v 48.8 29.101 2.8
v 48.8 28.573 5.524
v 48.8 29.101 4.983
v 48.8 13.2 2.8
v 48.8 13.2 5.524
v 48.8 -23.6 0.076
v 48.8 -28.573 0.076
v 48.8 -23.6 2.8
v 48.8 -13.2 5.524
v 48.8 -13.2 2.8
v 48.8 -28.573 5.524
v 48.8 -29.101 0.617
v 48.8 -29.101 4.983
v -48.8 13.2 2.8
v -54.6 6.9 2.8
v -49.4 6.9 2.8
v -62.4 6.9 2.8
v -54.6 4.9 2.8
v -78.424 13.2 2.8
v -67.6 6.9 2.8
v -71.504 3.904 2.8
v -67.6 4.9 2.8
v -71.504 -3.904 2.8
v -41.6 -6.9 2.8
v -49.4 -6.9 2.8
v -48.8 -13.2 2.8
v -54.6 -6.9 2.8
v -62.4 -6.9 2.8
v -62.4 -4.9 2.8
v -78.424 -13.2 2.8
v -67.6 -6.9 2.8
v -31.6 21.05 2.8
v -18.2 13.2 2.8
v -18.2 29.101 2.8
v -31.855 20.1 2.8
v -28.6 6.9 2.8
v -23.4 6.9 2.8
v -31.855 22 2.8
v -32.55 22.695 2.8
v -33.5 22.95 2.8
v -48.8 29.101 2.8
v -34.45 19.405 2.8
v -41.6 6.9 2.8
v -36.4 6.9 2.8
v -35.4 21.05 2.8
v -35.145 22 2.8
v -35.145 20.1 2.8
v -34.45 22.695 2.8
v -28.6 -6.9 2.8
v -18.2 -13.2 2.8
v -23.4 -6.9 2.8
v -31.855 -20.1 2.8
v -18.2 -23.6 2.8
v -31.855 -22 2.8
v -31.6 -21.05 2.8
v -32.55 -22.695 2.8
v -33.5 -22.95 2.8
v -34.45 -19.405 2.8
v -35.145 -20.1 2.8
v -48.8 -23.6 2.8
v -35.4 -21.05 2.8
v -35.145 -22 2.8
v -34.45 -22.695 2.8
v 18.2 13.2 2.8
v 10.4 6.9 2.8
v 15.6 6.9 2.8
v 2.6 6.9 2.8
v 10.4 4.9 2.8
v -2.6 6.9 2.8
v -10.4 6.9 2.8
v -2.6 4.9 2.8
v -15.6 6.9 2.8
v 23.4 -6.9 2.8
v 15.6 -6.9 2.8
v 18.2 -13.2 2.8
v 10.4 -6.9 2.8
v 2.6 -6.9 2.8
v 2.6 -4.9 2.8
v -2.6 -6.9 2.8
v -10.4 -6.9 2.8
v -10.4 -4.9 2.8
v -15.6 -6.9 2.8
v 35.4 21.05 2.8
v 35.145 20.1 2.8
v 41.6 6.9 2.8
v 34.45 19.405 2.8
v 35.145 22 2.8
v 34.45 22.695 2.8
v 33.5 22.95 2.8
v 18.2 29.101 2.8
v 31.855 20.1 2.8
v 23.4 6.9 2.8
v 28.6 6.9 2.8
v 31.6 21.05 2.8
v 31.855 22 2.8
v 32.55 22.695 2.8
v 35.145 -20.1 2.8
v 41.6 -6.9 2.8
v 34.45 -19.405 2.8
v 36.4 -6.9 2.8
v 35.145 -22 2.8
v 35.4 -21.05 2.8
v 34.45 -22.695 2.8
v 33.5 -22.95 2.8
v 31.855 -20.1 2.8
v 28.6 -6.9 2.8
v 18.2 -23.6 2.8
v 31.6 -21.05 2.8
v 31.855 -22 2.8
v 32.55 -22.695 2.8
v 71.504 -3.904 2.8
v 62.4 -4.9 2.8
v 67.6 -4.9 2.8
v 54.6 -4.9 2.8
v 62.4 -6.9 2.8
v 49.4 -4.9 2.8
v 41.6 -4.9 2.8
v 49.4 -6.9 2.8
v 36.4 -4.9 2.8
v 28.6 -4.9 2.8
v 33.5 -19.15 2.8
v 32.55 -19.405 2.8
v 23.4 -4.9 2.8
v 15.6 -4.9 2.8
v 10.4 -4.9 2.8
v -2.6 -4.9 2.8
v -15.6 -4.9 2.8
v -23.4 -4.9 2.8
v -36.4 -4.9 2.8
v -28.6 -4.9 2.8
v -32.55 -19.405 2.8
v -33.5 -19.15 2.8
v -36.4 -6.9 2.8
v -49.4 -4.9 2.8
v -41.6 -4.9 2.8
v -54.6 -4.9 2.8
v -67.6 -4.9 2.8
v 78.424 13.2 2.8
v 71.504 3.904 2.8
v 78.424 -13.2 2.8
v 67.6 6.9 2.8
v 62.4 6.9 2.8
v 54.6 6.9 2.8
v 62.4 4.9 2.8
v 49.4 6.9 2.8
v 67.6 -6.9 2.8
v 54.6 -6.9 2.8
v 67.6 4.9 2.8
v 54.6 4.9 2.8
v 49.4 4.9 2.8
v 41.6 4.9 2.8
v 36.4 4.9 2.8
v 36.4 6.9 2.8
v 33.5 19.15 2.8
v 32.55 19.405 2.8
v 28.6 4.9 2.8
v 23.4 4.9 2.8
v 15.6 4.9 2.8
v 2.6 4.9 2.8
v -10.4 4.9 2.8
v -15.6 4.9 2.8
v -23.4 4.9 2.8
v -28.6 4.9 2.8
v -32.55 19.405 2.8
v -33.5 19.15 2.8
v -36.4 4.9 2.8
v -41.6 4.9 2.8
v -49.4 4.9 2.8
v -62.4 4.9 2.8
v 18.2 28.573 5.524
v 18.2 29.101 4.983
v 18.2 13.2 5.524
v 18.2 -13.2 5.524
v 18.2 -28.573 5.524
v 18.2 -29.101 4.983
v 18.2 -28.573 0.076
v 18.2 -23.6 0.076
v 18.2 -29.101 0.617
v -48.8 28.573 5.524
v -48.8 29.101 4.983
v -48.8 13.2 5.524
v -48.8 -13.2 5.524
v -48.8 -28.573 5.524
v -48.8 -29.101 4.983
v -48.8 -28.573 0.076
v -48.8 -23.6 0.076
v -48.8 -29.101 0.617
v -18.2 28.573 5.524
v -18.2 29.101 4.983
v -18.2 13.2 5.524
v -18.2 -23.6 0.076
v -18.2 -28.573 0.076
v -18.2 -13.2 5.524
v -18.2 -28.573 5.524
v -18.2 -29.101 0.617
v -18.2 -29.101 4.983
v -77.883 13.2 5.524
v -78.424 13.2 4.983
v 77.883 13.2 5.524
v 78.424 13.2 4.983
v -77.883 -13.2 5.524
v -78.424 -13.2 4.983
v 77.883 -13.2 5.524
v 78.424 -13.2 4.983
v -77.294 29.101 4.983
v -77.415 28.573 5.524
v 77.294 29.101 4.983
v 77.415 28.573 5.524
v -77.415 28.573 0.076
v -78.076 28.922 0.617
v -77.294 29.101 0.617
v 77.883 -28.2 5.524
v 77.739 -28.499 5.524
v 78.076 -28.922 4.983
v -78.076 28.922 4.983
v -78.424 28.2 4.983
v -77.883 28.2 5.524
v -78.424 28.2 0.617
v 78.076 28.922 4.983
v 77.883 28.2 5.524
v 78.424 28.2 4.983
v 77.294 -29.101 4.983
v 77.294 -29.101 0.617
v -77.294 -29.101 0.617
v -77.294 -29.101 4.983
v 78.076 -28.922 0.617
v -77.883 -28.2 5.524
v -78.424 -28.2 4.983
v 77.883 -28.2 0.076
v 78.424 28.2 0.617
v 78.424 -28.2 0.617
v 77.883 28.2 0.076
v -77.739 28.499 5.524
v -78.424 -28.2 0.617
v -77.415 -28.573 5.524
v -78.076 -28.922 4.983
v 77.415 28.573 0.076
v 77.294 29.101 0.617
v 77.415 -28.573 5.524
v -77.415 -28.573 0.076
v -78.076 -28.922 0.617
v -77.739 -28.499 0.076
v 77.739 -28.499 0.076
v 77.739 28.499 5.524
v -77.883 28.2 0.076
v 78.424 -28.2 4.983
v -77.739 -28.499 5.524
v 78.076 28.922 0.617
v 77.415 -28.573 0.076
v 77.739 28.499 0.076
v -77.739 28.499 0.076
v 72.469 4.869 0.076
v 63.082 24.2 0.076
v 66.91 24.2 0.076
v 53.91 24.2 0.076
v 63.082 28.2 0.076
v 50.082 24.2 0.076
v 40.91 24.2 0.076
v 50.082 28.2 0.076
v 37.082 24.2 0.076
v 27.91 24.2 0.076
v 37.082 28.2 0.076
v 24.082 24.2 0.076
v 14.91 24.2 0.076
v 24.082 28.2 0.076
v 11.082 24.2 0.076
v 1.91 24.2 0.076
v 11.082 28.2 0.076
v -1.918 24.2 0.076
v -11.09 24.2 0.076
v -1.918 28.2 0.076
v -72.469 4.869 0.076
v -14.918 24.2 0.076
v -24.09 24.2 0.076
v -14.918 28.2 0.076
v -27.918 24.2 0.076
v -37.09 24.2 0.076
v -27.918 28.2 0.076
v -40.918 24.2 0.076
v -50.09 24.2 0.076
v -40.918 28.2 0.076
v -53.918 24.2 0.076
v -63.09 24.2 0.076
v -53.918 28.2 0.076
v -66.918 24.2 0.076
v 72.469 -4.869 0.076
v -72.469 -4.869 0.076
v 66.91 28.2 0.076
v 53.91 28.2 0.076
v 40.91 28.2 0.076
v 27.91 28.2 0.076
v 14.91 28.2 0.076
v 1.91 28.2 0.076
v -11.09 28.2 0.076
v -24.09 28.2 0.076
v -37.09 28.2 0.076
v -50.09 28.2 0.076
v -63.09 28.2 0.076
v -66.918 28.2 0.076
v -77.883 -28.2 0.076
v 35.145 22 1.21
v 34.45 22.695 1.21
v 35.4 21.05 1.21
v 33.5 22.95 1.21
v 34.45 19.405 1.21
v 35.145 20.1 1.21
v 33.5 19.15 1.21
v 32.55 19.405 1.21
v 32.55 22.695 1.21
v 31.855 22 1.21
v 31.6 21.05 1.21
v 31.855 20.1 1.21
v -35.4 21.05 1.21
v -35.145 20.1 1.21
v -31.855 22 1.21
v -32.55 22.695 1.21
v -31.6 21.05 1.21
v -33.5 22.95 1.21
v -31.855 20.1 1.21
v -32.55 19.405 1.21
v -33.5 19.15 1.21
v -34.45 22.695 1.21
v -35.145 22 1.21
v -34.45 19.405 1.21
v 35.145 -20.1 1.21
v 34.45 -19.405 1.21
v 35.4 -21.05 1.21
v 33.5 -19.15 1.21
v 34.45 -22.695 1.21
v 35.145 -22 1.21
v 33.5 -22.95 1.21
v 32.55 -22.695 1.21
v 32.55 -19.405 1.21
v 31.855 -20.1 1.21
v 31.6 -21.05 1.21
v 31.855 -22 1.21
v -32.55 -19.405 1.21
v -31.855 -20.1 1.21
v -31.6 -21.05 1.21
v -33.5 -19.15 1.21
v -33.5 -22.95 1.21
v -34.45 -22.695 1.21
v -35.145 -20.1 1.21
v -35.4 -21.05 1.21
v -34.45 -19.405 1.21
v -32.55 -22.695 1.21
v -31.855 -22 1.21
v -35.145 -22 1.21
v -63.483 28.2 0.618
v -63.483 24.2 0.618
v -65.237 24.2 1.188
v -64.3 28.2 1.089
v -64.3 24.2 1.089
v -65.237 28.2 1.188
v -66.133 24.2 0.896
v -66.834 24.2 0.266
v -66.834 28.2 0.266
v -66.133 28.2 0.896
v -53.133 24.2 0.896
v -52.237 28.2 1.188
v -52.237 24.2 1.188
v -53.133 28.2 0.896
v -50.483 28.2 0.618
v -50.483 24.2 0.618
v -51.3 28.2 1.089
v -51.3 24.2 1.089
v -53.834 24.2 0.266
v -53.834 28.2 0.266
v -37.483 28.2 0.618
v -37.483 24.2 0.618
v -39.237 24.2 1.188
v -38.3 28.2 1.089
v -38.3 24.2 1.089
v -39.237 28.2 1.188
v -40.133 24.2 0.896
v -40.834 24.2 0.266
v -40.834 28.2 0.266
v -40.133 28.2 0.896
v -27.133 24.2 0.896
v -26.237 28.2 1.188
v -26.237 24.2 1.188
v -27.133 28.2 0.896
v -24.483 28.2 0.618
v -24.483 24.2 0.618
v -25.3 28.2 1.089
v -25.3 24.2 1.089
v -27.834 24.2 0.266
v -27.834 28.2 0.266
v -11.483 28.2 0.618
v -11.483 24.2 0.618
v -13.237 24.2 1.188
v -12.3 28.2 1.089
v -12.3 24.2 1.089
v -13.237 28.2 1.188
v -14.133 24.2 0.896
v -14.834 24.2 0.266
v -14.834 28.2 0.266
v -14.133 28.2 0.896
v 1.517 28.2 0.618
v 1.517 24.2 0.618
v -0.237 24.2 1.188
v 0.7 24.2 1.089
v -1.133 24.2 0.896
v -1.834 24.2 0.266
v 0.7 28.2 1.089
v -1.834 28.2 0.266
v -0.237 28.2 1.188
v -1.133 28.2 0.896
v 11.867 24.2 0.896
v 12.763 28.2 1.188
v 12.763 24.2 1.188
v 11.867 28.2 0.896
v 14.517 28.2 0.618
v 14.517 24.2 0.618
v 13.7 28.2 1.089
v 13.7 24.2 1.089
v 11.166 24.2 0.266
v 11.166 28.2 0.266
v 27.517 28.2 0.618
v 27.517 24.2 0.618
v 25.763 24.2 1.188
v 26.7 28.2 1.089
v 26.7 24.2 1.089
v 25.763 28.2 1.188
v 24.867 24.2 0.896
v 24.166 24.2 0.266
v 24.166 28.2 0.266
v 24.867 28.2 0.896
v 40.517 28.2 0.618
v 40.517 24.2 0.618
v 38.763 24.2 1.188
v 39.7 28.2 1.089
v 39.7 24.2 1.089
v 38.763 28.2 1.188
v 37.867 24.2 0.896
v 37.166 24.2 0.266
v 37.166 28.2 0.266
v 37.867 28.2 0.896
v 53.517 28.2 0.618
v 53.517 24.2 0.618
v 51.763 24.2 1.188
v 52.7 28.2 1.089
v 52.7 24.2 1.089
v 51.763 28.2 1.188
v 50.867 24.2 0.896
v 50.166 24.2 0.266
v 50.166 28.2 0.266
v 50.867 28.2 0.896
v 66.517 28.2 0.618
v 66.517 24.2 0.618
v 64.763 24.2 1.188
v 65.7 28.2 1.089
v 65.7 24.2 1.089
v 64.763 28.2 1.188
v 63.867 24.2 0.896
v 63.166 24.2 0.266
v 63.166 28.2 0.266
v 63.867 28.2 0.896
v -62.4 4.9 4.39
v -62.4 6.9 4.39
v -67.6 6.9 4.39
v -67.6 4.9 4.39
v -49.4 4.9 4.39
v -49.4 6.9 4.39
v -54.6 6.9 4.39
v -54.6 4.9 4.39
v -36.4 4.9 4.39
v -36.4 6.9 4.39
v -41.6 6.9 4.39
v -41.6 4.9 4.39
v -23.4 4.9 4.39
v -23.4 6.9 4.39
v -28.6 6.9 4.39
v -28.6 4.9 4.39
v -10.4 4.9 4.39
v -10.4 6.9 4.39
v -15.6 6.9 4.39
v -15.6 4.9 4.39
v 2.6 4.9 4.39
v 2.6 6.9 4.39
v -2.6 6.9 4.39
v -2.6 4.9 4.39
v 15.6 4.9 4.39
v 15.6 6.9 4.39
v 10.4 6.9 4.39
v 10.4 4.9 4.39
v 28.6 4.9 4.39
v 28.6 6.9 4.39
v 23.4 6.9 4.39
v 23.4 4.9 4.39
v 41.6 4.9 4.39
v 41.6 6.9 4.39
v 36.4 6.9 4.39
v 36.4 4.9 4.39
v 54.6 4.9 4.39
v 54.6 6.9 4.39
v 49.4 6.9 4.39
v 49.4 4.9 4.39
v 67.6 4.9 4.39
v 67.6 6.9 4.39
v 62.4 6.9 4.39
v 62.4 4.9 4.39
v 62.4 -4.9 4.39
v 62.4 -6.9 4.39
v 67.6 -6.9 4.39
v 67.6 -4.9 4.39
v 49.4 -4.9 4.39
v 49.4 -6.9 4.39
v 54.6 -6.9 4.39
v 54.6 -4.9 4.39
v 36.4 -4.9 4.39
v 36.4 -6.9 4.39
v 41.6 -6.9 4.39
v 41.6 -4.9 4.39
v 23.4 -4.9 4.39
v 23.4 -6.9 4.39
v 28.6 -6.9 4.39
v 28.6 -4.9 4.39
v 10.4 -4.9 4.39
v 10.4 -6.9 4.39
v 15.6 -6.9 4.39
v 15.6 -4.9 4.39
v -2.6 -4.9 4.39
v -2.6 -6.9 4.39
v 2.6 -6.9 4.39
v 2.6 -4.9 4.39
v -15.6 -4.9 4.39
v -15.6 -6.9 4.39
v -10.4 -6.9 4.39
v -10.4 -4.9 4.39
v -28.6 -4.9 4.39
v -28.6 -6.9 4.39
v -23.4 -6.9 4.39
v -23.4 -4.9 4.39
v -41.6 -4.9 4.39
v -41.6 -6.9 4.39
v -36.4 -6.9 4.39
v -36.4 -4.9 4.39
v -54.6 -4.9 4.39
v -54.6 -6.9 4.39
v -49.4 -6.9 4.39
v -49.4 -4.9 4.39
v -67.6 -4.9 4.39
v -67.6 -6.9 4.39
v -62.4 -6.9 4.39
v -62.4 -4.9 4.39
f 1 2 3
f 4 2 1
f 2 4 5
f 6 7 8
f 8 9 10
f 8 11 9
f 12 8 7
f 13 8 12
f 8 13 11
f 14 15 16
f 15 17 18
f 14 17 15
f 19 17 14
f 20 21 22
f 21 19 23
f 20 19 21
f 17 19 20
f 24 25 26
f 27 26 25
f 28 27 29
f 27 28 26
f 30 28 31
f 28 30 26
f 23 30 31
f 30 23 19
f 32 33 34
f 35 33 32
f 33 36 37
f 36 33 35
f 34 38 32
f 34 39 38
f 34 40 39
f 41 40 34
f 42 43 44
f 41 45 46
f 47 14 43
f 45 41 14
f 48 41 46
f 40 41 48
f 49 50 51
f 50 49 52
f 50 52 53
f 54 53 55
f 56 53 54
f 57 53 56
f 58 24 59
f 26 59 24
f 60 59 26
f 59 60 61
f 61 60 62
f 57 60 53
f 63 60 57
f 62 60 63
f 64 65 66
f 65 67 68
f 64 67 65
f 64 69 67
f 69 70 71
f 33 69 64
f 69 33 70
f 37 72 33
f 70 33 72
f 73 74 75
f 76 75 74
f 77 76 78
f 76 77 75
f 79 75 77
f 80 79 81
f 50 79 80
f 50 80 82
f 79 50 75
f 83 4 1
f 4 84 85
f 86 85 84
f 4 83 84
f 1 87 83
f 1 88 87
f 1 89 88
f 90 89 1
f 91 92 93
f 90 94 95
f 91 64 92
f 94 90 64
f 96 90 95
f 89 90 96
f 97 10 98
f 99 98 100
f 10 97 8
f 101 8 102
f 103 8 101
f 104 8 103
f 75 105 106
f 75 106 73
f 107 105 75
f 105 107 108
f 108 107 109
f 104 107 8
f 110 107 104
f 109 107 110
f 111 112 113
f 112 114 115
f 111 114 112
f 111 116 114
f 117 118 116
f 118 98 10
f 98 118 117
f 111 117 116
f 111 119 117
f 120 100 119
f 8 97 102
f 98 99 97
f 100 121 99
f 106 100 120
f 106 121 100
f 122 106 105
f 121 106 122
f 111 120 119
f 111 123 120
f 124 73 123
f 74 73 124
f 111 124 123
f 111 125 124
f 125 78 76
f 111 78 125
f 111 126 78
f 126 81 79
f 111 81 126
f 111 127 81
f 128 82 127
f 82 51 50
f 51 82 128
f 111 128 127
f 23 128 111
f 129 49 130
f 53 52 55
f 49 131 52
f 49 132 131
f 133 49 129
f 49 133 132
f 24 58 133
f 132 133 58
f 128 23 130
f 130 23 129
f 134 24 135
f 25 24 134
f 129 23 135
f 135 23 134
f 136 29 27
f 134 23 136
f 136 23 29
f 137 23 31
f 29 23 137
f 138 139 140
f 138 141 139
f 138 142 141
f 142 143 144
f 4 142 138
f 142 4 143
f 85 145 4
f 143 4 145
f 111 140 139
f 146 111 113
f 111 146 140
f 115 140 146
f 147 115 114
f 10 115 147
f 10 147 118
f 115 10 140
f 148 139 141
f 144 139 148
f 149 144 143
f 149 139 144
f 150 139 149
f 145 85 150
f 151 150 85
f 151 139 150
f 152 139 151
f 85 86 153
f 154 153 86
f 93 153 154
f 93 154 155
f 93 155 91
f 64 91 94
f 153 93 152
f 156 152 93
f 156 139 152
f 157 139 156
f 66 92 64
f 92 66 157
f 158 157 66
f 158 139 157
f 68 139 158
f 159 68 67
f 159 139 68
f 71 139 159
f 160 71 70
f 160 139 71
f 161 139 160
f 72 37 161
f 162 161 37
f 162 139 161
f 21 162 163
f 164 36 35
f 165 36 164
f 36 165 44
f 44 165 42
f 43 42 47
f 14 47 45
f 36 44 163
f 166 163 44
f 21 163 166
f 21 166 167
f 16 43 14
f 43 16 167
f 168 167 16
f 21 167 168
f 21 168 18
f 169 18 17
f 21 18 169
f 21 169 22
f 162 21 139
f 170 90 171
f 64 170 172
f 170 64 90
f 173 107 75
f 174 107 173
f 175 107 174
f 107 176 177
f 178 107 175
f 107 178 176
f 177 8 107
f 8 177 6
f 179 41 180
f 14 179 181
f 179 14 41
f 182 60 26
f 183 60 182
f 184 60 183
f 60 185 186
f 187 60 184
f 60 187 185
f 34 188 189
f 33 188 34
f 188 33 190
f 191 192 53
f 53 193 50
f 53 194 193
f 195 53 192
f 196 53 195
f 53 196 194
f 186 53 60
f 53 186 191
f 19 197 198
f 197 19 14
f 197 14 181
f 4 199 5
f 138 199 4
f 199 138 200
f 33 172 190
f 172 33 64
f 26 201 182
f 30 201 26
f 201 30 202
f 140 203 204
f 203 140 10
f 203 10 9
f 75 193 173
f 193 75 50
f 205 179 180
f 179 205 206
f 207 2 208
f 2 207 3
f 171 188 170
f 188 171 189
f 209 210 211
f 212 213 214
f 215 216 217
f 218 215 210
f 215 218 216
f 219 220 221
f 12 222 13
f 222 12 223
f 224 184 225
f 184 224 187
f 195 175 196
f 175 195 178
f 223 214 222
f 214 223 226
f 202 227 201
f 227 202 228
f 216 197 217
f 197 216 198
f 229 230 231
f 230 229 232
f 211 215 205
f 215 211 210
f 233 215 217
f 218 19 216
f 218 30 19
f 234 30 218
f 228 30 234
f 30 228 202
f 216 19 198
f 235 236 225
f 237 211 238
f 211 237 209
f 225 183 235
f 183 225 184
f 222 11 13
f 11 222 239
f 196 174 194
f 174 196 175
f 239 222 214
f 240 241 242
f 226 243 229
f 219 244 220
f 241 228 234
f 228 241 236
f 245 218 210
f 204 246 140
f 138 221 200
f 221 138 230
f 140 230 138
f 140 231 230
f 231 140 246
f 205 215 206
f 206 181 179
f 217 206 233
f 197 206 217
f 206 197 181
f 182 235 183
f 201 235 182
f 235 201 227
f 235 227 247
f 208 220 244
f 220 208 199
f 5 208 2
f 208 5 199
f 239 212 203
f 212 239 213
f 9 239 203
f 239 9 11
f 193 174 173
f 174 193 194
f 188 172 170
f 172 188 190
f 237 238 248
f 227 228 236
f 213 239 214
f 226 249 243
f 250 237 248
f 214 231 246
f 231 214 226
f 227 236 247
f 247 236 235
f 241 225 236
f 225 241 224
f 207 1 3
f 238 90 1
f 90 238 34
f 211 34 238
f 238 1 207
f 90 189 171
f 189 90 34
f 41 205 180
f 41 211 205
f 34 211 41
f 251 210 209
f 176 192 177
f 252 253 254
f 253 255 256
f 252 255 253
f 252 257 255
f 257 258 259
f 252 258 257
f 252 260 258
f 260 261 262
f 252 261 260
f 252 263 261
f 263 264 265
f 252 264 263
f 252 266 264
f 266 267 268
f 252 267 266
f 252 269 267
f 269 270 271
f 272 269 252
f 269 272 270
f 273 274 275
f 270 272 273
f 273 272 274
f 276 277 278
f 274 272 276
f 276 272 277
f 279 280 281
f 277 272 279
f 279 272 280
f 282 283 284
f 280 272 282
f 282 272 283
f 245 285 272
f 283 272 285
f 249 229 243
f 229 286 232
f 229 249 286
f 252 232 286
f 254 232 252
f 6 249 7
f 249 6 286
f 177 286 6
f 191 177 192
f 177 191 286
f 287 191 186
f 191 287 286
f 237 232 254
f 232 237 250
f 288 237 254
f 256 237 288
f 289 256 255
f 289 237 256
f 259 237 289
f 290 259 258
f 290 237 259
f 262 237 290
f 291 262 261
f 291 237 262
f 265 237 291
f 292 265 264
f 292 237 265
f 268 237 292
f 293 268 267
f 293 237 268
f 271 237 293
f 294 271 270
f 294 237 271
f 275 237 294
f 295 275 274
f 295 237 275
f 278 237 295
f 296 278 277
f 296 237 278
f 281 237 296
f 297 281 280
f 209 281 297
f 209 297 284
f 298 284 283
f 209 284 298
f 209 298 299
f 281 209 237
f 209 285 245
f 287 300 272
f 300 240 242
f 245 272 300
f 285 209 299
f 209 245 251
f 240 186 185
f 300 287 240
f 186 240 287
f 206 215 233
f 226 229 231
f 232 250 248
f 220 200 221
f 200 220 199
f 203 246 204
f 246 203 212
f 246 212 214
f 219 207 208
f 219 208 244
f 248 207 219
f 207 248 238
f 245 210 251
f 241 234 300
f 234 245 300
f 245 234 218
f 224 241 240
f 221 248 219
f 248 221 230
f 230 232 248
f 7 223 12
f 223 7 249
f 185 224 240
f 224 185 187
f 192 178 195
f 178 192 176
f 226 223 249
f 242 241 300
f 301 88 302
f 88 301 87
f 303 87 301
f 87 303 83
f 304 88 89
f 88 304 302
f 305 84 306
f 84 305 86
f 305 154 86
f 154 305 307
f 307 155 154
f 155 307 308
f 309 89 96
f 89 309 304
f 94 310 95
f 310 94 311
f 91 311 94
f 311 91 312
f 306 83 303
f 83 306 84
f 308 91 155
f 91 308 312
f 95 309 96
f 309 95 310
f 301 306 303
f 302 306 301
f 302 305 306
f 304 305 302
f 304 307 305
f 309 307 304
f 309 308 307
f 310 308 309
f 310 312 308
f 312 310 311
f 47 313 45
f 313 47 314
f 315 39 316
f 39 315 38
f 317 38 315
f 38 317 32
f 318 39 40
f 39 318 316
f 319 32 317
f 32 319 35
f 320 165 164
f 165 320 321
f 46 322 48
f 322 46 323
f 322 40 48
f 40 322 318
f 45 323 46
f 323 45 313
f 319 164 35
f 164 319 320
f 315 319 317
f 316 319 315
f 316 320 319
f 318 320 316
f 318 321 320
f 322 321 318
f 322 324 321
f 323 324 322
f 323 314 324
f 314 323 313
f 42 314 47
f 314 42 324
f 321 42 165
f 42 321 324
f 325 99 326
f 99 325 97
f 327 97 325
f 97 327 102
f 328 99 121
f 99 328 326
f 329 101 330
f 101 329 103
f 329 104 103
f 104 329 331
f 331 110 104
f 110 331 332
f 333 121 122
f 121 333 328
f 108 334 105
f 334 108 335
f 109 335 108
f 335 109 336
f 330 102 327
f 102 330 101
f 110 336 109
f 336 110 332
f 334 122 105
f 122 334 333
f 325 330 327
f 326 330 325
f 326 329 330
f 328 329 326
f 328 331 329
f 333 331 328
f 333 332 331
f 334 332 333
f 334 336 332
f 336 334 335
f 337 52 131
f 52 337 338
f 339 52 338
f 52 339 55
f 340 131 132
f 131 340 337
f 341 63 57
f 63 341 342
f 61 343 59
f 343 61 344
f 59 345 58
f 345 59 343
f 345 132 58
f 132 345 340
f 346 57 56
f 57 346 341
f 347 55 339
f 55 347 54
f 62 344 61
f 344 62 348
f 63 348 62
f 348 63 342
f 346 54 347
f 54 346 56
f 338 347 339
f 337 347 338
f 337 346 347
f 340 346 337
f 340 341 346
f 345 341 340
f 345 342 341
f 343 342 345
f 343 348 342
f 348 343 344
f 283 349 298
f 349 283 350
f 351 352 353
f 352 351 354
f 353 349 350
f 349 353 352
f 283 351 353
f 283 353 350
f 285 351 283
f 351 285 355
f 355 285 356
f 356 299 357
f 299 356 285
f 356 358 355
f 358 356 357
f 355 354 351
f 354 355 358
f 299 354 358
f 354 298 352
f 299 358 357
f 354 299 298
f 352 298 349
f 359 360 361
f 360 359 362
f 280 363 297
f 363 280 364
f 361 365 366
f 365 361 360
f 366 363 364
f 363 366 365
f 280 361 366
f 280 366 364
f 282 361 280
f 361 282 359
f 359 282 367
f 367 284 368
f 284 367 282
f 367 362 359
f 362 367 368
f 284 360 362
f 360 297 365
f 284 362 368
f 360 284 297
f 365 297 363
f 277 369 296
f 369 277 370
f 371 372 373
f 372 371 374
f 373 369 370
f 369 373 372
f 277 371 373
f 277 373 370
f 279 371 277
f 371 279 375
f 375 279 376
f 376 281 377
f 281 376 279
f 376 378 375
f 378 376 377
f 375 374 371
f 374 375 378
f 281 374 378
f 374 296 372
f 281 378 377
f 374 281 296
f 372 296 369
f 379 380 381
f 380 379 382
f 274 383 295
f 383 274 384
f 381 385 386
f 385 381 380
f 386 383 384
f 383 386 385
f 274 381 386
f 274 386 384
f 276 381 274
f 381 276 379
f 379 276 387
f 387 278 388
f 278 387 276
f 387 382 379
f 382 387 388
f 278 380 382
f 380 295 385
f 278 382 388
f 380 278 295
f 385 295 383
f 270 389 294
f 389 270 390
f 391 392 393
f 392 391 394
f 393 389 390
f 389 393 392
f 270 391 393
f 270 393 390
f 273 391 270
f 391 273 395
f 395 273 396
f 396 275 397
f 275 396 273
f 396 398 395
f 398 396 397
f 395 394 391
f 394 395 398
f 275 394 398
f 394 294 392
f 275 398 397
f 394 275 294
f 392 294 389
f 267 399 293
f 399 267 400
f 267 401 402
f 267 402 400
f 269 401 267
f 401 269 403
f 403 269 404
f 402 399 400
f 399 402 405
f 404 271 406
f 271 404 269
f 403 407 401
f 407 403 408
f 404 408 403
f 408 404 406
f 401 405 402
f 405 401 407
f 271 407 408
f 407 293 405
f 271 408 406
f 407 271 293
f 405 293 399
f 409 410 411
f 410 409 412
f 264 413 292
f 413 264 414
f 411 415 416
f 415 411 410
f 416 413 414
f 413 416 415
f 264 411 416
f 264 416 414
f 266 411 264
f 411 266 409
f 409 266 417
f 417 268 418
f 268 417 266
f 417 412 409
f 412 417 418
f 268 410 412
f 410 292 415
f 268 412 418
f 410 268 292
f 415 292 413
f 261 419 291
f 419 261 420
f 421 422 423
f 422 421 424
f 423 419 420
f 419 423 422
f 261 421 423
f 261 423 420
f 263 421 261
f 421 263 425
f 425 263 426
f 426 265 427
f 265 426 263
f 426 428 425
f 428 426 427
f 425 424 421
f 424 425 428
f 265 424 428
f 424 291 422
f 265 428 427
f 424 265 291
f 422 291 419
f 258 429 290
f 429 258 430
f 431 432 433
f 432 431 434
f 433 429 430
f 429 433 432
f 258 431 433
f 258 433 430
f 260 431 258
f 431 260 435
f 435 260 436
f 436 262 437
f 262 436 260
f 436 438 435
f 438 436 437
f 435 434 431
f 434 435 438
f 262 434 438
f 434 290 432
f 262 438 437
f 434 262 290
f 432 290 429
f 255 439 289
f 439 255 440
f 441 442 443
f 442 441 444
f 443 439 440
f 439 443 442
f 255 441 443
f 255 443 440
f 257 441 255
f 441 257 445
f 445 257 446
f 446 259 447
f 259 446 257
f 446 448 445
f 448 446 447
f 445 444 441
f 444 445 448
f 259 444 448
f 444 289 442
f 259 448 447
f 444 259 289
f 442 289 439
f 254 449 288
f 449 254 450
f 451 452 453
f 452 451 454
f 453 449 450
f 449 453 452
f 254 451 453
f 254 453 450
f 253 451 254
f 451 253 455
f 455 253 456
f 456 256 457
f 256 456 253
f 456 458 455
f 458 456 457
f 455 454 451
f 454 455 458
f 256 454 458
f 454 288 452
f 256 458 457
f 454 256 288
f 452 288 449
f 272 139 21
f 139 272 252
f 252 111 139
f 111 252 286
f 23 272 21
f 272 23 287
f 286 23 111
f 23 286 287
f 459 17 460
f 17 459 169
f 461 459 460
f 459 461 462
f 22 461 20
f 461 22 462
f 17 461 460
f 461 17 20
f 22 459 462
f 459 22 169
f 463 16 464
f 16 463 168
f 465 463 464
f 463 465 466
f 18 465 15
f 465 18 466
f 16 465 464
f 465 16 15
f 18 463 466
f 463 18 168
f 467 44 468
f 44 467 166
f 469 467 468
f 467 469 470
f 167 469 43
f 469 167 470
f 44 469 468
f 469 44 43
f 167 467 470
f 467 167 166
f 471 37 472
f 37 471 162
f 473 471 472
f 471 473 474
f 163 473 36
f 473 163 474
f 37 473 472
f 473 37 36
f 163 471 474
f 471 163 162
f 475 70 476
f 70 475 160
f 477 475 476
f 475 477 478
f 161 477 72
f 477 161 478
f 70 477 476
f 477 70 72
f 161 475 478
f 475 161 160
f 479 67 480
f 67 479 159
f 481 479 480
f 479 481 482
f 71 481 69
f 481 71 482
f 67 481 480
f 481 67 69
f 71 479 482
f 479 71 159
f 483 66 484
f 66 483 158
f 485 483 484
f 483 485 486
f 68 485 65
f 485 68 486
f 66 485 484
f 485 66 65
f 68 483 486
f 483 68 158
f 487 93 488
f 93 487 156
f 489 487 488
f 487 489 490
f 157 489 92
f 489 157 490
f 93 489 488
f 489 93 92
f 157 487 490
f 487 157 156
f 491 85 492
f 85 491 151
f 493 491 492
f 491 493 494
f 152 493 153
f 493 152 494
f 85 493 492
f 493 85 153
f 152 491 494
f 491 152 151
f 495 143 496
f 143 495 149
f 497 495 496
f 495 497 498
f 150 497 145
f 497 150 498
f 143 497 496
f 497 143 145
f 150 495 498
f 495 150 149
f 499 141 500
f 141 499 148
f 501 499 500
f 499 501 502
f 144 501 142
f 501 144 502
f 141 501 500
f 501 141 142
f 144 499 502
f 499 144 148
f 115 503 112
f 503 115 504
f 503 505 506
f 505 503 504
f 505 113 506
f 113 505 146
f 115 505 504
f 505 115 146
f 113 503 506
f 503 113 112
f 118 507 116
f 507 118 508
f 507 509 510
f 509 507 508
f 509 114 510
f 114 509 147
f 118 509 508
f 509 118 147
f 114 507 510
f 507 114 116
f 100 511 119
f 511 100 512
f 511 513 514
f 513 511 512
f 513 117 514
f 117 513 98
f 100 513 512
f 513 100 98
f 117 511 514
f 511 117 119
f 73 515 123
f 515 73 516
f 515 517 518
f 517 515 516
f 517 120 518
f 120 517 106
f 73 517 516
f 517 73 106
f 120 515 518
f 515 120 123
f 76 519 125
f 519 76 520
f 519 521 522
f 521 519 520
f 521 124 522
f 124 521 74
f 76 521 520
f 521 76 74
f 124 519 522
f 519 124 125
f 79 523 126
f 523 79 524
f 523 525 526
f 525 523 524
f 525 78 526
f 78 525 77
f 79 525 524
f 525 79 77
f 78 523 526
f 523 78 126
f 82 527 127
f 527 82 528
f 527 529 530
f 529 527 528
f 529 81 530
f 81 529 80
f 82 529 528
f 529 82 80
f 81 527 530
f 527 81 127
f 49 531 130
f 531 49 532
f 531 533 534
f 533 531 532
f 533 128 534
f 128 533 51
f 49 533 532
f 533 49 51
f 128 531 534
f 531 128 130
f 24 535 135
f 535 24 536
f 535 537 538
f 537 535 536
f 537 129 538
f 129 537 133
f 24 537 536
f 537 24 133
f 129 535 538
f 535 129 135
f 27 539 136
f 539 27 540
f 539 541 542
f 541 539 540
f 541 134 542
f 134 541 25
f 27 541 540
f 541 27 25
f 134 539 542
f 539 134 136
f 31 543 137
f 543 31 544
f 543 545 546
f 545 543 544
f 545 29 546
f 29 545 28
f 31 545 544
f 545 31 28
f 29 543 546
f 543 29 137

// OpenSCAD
// -*- mode: SCAD ; c-file-style: "ellemtel" ; coding: utf-8 -*-
//
// Holder to scan Minox film strips with a Reflecta ProScan 10T
//
// © 2018 Roland Sieker <ospalh@gmail.com>
// Licence: CC-BY-SA 4.0


// Customizer-code rausgenommen. Hier gibt’s nicht viel zu verstellen.

// Teile wieder rein. Das preview, stack, print ist gut.
// … to preview. You will get all parts when you click “Create Thing”.
part = "halter"; // [halter: Filmhalter, einsatz: Klemmeinsatz]


// Auf false schalten, ums STL zu erzeugen
preview = true;


// Ausser vielleicht den Filmstreifengrößen.

// *******************
// These are for Minox
// *******************
// Comment them out for 110
w_streifen = 9.2;
// w_bild = 8;
w_bild = 7.8;  // Nominal 8. Mehr Auflagefläche
l_bild = 13;
bilder_ps = 11;
l_filmsteg = 0;
// Keine Fensterstege. Für einen auf Dauer präzisen Transportmechanismus
// war in den Minoxkameras wohl kein Platz mehr. Jedenfalls schwankt der
// Abstand von Bild zu Bild bei meinen Streifen enorm.
// Die geringe Breite und die seitlichen Stege sollten reichen.

// // ********************
// // Try this set for 110
// // ********************
// // Uncomment these in for 110
// w_streifen = 16;
// w_bild = 13.4; // Nominally 13. This should work out
// l_bild = 25.4;
// // Total pitch, picture plus number and hole. Measured. Might be exactly
// // 25.4 mm, as the format was made by Americans.
// bilder_ps = 7;
// // The strips i got were all 5. Otoh, the 135 holder you get with the
// // scanner has 6 holes and the strips i have all have 4. So, +2.
// l_filmsteg = 0.8;
// Steg zwischen zwei Bildern. Zwei mal rüber mit der Düse


// Größen des Halters.

// Länge == Maß in Richtung des Filmlaus.
// Höhe == Maß normal zum Film
// Breite oder Weite == Maß in Richtung Filmkante zu Filmkante

// Die beiden wichtigen. Wenn diese falsch sind passt’s nicht oder wackelt.
h_ue_a = 5.6;  // Höhe über alles. War 6
w_gesamt = 58.4;  // Gesamtbreite. Original: 59
r_r = 1.0;  // Rundungsradius

// Auch wichtig:
l_zk = 4;  // Länge Zentrierkerbe
b_zk = 4;  // Breite Zentrierkerbe
h_zk = 1.2;  // Tiefe der Zentrierkerbe
w_zk = 1;  // Wand bzw Abstand der Zentrierkerbe vom Rand

l_griff = 30;
o_griff = 30;
w_griff = 5;

// Halbwegs wichtig
h_nut = 1.8;  // Tiefe für Stücke, auf denen der Film nicht aufliegt
h_steg = 1.6;  // Höhe für Stücke, die den Film zentrieren.
w_steg = 2;  // Breite für Stücke, die den Film zentrieren.
l_kurzsteg = 0.4*l_bild;  // Länge für Stücke, die den Film zentrieren,
// wenn wier keine Fensterstege machen





// Größen der Haltemagnete
d_mag = 3.8; // großes Loch
h_mag = 1;

w_schraeg = 1;  // Breite der Abschrägung rund um die Filmfenster




// *******************************************************
// Extra parameters. These can be changed reasonably safely.


w = 1.8;  // Wall width
p = 1.2;  // Bottom, top plate height
c = 0.6;  // Clearance
angle = 60; // Overhangs much below 60° are a problem for me

// *******************************************************
// Some shortcuts. These shouldn’t be changed

tau = 2 * PI;  // π is still wrong. τ = ⌀ ÷ r

xy_factor = 1/tan(angle);
// To get from a height to a horizontal width inclined correctly
z_factor = tan(angle);  // The other way around

some_distance = 1.2 * w_gesamt;
ms = 0.01;  // Muggeseggele.

// fn for differently sized objects and fs, fa; all for preview or rendering.
pna = 40;
pnb = 15;
pa = 5;
ps = 1;
rna = 180;
rnb = 30;
ra = 1;
rs = 0.1;
function na() = (preview) ? pna : rna;
function nb() = (preview) ? pnb : rnb;
$fs = (preview) ? ps : rs;
$fa = (preview) ? pa : ra;

l_fenster = l_bild * bilder_ps;
l_rand = 2 * w_steg + w_schraeg + 2;
w_rand = w_schraeg + 8;
l_ue_a =  l_fenster + 2*l_rand;
w_einsatz = w_bild + 2 * w_rand;
h_bd = h_ue_a/2;  // Höhe Boden oder Deckel

to_griff = l_ue_a/2 - o_griff - l_griff/2;



// *******************************************************
// End setup




// *******************************************************
// Generate the parts


print_part();
// filmhalter();
// einsatz();
// preview_parts();
// stack_parts();



module print_part()
{
   if ("halter" == part)
   {
      filmhalter();
   }
   if ("einsatz" == part)
   {
      einsatz();
   }
}

module preview_parts()
{
   filmhalter();
   translate([0, some_distance, 0])
   {
      einsatz();
   }
}

module stack_parts()
{
   // intersection()
   {
       // color("yellow")
      {
         filmhalter();
      }
      translate([0,0,h_ue_a + ms])
      {
         rotate([0,180,0])
         {
            // color("red")
            {
               einsatz();
            }
         }
      }
   }
}

// *******************************************************
// Code for the parts themselves


module filmhalter()
{
   difference()
   {
      basis_filmhalter();
      fenster();
      magnetausschnitte(0);
      kerben();
   }
   fensterstege();
   bodenstege();
}

module einsatz()
{
   difference()
   {
      union()
      {
         difference()
         {
            basis_einsatz();
            fenster();
         }
         fensterstege();
      }
      einsatzausschnitte();
      // magnetausschnitte(d_mag/2);
      magnetausschnitte(0);
   }

}


module basis_filmhalter()
{
   translate([0,0,h_bd])
   {
      difference()
      {
         massiver_halter();
         einsatz_ausschnitt(c);
      }
   }
}


module basis_einsatz()
{
   translate([0,0,h_bd])
   {
      intersection()
      {
         massiver_halter();
         rotate([0,180,0])
         {
            einsatz_ausschnitt(0);
         }
      }
   }

}

module massiver_halter()
{
   hull()
   {
      vosp();
      mirror([0,0,1])
      {
         vosp();
      }
   }

   module vosp()
   {
      tosp();
      mirror([0,1,0])
      {
         tosp();
      }
   }
   module tosp()
   {
      osp();
      mirror([1,0,0])
      {
         osp();
      }

   }

   module osp()
   {
      translate([l_ue_a/2-r_r, w_gesamt/2-r_r, h_ue_a/2-r_r])
      {
         sphere(r=r_r);
      }
   }
}


module einsatz_ausschnitt(ec)
{
   translate([0, 0, h_ue_a])
   {
      cube([l_ue_a+2*ms, w_einsatz + ec, 2*h_ue_a], center=true);
      grip_cut();
      mirror()
      {
         grip_cut();
      }
   }
   module grip_cut()
   {
      translate([to_griff, 0, 0])
      {
         cube([l_griff + ec, w_gesamt + 2*ms, 2*h_ue_a], center=true);
         translate([0, -w_gesamt/2, 0])
         {
            cube([l_griff + ec, 2*w_griff+2*ec, 4*h_ue_a], center=true);
         }
      }
   }
}

module fenster()
{
   translate([0, 0, h_bd])
   {
      hull()
      {
         translate([0,0,-0.5+ms])
         {
            cube([l_fenster, w_bild, 1], center=true);
         }
         translate([0,0,-h_bd-0.5-ms])
         {
            cube(
               [l_fenster+2*w_schraeg, w_bild+2*w_schraeg, 1], center=true);
         }
      }

   }
}


module magnetausschnitte(mo)
{
   magnetausschnitt(1, 1, mo);
   magnetausschnitt(-1, 1, mo);
   magnetausschnitt(1, -1, mo);
   magnetausschnitt(-1, -1, mo);
}

module magnetausschnitt(xf, yf, mo)
{
   yo_mag = w_einsatz/2 + (w_gesamt - w_einsatz)/4;
   // Mittig in den Griffen.
   translate(
      [xf * (to_griff - mo), yf * (yo_mag-mo), h_bd - h_mag-c + ms])
   {
      cylinder(d=d_mag, h=h_mag+c);  // N.B. Spiel ist schon im d_mag
      // eingerechnet
   }
}

module bodenstege()
{
   translate([0, 0, -ms+h_steg/2+h_bd])
   {
      if (l_filmsteg > 0)
      {
         langbodensteg();
         rotate(180)
         {
            langbodensteg();
         }
      }
      else
      {
         kurzbodenstege();
         rotate(180)
         {
            kurzbodenstege();
         }
      }
   }
   module langbodensteg()
   {
      translate([0,w_steg/2+w_streifen/2+c/2, 0])
      {
         cube([l_fenster, w_steg, h_steg], center=true);
      }
   }
   module kurzbodenstege()
   {
      for (i=[0:bilder_ps-1])
      {
         translate([-l_fenster/2 + (0.5 + i) * l_bild, w_steg/2+w_streifen/2+c/2, 0])
         {
            cube([l_kurzsteg, w_steg, h_steg], center=true);
         }
      }
   }
}

module einsatzausschnitte()
{
   translate([0, 0, h_bd + ms-h_nut/2])
   {
      if (l_filmsteg > 0)
      {
         langausschnitt();
         rotate(180)
         {
            langausschnitt();
         }
      }
      else
      {
         kurzausschnitte();
         rotate(180)
         {
            kurzausschnitte();
         }
      }
   }
   module langausschnitt()
   {
      translate([0,w_steg/2+w_streifen/2+c/2,0])
      {
         cube([l_fenster+6*c, w_steg+2*c, h_nut], center=true);
      }
   }
   module kurzausschnitte()
   {
      for (i=[0:bilder_ps-1])
      {
         translate([-l_fenster/2 + (0.5 + i) * l_bild, w_steg/2+w_streifen/2+c/2-w_streifen/4 + w_bild/4, 0])
         {
            cube([l_kurzsteg+2*c, w_steg+2*c+w_streifen/2 - w_bild/2, h_nut], center=true);
         }
      }
   }
}


module fensterstege()
{
   if (l_filmsteg > 0)
   {
      for (i=[1:bilder_ps-1])
      {
         translate([-l_fenster/2 + i * l_bild, 0, h_bd/2-ms])
         {
            cube([l_filmsteg, w_bild+2*w_schraeg + 2*ms ,h_bd], center=true);
         }
      }
   }
}

module kerben()
{
   // Den Radius der Zentrierkerbe kann mensch per Pythagoras bestimmen.
   // Hypothenuse = r_zk
   // 1. Kathete = l_zk/2
   // 2. Kathete = r_zk - h_zk
   // h_zk > 0
   // r_zk * r_zk = l_zk * l_zk / 4 + r_zk * r_zk - 2 * r_zk * h_zk + h_zk * h_zk
   // 0 = l_zk * l_zk / 4 - 2 * r_zk * h_zk + h_zk * h_zk
   // 2 * r_zk * h_zk =
   r_zk = (l_zk * l_zk / 4 + h_zk * h_zk) / (2 * h_zk);
   for (i=[0:bilder_ps-1])
   {
      translate(
         [-l_fenster/2 + i * l_bild + l_bild/2, w_gesamt/2 - w_zk, h_zk-r_zk])
      {
         rotate([90,0,0])
         {
            cylinder(r=r_zk, h=b_zk);
         }
      }
   }

}
